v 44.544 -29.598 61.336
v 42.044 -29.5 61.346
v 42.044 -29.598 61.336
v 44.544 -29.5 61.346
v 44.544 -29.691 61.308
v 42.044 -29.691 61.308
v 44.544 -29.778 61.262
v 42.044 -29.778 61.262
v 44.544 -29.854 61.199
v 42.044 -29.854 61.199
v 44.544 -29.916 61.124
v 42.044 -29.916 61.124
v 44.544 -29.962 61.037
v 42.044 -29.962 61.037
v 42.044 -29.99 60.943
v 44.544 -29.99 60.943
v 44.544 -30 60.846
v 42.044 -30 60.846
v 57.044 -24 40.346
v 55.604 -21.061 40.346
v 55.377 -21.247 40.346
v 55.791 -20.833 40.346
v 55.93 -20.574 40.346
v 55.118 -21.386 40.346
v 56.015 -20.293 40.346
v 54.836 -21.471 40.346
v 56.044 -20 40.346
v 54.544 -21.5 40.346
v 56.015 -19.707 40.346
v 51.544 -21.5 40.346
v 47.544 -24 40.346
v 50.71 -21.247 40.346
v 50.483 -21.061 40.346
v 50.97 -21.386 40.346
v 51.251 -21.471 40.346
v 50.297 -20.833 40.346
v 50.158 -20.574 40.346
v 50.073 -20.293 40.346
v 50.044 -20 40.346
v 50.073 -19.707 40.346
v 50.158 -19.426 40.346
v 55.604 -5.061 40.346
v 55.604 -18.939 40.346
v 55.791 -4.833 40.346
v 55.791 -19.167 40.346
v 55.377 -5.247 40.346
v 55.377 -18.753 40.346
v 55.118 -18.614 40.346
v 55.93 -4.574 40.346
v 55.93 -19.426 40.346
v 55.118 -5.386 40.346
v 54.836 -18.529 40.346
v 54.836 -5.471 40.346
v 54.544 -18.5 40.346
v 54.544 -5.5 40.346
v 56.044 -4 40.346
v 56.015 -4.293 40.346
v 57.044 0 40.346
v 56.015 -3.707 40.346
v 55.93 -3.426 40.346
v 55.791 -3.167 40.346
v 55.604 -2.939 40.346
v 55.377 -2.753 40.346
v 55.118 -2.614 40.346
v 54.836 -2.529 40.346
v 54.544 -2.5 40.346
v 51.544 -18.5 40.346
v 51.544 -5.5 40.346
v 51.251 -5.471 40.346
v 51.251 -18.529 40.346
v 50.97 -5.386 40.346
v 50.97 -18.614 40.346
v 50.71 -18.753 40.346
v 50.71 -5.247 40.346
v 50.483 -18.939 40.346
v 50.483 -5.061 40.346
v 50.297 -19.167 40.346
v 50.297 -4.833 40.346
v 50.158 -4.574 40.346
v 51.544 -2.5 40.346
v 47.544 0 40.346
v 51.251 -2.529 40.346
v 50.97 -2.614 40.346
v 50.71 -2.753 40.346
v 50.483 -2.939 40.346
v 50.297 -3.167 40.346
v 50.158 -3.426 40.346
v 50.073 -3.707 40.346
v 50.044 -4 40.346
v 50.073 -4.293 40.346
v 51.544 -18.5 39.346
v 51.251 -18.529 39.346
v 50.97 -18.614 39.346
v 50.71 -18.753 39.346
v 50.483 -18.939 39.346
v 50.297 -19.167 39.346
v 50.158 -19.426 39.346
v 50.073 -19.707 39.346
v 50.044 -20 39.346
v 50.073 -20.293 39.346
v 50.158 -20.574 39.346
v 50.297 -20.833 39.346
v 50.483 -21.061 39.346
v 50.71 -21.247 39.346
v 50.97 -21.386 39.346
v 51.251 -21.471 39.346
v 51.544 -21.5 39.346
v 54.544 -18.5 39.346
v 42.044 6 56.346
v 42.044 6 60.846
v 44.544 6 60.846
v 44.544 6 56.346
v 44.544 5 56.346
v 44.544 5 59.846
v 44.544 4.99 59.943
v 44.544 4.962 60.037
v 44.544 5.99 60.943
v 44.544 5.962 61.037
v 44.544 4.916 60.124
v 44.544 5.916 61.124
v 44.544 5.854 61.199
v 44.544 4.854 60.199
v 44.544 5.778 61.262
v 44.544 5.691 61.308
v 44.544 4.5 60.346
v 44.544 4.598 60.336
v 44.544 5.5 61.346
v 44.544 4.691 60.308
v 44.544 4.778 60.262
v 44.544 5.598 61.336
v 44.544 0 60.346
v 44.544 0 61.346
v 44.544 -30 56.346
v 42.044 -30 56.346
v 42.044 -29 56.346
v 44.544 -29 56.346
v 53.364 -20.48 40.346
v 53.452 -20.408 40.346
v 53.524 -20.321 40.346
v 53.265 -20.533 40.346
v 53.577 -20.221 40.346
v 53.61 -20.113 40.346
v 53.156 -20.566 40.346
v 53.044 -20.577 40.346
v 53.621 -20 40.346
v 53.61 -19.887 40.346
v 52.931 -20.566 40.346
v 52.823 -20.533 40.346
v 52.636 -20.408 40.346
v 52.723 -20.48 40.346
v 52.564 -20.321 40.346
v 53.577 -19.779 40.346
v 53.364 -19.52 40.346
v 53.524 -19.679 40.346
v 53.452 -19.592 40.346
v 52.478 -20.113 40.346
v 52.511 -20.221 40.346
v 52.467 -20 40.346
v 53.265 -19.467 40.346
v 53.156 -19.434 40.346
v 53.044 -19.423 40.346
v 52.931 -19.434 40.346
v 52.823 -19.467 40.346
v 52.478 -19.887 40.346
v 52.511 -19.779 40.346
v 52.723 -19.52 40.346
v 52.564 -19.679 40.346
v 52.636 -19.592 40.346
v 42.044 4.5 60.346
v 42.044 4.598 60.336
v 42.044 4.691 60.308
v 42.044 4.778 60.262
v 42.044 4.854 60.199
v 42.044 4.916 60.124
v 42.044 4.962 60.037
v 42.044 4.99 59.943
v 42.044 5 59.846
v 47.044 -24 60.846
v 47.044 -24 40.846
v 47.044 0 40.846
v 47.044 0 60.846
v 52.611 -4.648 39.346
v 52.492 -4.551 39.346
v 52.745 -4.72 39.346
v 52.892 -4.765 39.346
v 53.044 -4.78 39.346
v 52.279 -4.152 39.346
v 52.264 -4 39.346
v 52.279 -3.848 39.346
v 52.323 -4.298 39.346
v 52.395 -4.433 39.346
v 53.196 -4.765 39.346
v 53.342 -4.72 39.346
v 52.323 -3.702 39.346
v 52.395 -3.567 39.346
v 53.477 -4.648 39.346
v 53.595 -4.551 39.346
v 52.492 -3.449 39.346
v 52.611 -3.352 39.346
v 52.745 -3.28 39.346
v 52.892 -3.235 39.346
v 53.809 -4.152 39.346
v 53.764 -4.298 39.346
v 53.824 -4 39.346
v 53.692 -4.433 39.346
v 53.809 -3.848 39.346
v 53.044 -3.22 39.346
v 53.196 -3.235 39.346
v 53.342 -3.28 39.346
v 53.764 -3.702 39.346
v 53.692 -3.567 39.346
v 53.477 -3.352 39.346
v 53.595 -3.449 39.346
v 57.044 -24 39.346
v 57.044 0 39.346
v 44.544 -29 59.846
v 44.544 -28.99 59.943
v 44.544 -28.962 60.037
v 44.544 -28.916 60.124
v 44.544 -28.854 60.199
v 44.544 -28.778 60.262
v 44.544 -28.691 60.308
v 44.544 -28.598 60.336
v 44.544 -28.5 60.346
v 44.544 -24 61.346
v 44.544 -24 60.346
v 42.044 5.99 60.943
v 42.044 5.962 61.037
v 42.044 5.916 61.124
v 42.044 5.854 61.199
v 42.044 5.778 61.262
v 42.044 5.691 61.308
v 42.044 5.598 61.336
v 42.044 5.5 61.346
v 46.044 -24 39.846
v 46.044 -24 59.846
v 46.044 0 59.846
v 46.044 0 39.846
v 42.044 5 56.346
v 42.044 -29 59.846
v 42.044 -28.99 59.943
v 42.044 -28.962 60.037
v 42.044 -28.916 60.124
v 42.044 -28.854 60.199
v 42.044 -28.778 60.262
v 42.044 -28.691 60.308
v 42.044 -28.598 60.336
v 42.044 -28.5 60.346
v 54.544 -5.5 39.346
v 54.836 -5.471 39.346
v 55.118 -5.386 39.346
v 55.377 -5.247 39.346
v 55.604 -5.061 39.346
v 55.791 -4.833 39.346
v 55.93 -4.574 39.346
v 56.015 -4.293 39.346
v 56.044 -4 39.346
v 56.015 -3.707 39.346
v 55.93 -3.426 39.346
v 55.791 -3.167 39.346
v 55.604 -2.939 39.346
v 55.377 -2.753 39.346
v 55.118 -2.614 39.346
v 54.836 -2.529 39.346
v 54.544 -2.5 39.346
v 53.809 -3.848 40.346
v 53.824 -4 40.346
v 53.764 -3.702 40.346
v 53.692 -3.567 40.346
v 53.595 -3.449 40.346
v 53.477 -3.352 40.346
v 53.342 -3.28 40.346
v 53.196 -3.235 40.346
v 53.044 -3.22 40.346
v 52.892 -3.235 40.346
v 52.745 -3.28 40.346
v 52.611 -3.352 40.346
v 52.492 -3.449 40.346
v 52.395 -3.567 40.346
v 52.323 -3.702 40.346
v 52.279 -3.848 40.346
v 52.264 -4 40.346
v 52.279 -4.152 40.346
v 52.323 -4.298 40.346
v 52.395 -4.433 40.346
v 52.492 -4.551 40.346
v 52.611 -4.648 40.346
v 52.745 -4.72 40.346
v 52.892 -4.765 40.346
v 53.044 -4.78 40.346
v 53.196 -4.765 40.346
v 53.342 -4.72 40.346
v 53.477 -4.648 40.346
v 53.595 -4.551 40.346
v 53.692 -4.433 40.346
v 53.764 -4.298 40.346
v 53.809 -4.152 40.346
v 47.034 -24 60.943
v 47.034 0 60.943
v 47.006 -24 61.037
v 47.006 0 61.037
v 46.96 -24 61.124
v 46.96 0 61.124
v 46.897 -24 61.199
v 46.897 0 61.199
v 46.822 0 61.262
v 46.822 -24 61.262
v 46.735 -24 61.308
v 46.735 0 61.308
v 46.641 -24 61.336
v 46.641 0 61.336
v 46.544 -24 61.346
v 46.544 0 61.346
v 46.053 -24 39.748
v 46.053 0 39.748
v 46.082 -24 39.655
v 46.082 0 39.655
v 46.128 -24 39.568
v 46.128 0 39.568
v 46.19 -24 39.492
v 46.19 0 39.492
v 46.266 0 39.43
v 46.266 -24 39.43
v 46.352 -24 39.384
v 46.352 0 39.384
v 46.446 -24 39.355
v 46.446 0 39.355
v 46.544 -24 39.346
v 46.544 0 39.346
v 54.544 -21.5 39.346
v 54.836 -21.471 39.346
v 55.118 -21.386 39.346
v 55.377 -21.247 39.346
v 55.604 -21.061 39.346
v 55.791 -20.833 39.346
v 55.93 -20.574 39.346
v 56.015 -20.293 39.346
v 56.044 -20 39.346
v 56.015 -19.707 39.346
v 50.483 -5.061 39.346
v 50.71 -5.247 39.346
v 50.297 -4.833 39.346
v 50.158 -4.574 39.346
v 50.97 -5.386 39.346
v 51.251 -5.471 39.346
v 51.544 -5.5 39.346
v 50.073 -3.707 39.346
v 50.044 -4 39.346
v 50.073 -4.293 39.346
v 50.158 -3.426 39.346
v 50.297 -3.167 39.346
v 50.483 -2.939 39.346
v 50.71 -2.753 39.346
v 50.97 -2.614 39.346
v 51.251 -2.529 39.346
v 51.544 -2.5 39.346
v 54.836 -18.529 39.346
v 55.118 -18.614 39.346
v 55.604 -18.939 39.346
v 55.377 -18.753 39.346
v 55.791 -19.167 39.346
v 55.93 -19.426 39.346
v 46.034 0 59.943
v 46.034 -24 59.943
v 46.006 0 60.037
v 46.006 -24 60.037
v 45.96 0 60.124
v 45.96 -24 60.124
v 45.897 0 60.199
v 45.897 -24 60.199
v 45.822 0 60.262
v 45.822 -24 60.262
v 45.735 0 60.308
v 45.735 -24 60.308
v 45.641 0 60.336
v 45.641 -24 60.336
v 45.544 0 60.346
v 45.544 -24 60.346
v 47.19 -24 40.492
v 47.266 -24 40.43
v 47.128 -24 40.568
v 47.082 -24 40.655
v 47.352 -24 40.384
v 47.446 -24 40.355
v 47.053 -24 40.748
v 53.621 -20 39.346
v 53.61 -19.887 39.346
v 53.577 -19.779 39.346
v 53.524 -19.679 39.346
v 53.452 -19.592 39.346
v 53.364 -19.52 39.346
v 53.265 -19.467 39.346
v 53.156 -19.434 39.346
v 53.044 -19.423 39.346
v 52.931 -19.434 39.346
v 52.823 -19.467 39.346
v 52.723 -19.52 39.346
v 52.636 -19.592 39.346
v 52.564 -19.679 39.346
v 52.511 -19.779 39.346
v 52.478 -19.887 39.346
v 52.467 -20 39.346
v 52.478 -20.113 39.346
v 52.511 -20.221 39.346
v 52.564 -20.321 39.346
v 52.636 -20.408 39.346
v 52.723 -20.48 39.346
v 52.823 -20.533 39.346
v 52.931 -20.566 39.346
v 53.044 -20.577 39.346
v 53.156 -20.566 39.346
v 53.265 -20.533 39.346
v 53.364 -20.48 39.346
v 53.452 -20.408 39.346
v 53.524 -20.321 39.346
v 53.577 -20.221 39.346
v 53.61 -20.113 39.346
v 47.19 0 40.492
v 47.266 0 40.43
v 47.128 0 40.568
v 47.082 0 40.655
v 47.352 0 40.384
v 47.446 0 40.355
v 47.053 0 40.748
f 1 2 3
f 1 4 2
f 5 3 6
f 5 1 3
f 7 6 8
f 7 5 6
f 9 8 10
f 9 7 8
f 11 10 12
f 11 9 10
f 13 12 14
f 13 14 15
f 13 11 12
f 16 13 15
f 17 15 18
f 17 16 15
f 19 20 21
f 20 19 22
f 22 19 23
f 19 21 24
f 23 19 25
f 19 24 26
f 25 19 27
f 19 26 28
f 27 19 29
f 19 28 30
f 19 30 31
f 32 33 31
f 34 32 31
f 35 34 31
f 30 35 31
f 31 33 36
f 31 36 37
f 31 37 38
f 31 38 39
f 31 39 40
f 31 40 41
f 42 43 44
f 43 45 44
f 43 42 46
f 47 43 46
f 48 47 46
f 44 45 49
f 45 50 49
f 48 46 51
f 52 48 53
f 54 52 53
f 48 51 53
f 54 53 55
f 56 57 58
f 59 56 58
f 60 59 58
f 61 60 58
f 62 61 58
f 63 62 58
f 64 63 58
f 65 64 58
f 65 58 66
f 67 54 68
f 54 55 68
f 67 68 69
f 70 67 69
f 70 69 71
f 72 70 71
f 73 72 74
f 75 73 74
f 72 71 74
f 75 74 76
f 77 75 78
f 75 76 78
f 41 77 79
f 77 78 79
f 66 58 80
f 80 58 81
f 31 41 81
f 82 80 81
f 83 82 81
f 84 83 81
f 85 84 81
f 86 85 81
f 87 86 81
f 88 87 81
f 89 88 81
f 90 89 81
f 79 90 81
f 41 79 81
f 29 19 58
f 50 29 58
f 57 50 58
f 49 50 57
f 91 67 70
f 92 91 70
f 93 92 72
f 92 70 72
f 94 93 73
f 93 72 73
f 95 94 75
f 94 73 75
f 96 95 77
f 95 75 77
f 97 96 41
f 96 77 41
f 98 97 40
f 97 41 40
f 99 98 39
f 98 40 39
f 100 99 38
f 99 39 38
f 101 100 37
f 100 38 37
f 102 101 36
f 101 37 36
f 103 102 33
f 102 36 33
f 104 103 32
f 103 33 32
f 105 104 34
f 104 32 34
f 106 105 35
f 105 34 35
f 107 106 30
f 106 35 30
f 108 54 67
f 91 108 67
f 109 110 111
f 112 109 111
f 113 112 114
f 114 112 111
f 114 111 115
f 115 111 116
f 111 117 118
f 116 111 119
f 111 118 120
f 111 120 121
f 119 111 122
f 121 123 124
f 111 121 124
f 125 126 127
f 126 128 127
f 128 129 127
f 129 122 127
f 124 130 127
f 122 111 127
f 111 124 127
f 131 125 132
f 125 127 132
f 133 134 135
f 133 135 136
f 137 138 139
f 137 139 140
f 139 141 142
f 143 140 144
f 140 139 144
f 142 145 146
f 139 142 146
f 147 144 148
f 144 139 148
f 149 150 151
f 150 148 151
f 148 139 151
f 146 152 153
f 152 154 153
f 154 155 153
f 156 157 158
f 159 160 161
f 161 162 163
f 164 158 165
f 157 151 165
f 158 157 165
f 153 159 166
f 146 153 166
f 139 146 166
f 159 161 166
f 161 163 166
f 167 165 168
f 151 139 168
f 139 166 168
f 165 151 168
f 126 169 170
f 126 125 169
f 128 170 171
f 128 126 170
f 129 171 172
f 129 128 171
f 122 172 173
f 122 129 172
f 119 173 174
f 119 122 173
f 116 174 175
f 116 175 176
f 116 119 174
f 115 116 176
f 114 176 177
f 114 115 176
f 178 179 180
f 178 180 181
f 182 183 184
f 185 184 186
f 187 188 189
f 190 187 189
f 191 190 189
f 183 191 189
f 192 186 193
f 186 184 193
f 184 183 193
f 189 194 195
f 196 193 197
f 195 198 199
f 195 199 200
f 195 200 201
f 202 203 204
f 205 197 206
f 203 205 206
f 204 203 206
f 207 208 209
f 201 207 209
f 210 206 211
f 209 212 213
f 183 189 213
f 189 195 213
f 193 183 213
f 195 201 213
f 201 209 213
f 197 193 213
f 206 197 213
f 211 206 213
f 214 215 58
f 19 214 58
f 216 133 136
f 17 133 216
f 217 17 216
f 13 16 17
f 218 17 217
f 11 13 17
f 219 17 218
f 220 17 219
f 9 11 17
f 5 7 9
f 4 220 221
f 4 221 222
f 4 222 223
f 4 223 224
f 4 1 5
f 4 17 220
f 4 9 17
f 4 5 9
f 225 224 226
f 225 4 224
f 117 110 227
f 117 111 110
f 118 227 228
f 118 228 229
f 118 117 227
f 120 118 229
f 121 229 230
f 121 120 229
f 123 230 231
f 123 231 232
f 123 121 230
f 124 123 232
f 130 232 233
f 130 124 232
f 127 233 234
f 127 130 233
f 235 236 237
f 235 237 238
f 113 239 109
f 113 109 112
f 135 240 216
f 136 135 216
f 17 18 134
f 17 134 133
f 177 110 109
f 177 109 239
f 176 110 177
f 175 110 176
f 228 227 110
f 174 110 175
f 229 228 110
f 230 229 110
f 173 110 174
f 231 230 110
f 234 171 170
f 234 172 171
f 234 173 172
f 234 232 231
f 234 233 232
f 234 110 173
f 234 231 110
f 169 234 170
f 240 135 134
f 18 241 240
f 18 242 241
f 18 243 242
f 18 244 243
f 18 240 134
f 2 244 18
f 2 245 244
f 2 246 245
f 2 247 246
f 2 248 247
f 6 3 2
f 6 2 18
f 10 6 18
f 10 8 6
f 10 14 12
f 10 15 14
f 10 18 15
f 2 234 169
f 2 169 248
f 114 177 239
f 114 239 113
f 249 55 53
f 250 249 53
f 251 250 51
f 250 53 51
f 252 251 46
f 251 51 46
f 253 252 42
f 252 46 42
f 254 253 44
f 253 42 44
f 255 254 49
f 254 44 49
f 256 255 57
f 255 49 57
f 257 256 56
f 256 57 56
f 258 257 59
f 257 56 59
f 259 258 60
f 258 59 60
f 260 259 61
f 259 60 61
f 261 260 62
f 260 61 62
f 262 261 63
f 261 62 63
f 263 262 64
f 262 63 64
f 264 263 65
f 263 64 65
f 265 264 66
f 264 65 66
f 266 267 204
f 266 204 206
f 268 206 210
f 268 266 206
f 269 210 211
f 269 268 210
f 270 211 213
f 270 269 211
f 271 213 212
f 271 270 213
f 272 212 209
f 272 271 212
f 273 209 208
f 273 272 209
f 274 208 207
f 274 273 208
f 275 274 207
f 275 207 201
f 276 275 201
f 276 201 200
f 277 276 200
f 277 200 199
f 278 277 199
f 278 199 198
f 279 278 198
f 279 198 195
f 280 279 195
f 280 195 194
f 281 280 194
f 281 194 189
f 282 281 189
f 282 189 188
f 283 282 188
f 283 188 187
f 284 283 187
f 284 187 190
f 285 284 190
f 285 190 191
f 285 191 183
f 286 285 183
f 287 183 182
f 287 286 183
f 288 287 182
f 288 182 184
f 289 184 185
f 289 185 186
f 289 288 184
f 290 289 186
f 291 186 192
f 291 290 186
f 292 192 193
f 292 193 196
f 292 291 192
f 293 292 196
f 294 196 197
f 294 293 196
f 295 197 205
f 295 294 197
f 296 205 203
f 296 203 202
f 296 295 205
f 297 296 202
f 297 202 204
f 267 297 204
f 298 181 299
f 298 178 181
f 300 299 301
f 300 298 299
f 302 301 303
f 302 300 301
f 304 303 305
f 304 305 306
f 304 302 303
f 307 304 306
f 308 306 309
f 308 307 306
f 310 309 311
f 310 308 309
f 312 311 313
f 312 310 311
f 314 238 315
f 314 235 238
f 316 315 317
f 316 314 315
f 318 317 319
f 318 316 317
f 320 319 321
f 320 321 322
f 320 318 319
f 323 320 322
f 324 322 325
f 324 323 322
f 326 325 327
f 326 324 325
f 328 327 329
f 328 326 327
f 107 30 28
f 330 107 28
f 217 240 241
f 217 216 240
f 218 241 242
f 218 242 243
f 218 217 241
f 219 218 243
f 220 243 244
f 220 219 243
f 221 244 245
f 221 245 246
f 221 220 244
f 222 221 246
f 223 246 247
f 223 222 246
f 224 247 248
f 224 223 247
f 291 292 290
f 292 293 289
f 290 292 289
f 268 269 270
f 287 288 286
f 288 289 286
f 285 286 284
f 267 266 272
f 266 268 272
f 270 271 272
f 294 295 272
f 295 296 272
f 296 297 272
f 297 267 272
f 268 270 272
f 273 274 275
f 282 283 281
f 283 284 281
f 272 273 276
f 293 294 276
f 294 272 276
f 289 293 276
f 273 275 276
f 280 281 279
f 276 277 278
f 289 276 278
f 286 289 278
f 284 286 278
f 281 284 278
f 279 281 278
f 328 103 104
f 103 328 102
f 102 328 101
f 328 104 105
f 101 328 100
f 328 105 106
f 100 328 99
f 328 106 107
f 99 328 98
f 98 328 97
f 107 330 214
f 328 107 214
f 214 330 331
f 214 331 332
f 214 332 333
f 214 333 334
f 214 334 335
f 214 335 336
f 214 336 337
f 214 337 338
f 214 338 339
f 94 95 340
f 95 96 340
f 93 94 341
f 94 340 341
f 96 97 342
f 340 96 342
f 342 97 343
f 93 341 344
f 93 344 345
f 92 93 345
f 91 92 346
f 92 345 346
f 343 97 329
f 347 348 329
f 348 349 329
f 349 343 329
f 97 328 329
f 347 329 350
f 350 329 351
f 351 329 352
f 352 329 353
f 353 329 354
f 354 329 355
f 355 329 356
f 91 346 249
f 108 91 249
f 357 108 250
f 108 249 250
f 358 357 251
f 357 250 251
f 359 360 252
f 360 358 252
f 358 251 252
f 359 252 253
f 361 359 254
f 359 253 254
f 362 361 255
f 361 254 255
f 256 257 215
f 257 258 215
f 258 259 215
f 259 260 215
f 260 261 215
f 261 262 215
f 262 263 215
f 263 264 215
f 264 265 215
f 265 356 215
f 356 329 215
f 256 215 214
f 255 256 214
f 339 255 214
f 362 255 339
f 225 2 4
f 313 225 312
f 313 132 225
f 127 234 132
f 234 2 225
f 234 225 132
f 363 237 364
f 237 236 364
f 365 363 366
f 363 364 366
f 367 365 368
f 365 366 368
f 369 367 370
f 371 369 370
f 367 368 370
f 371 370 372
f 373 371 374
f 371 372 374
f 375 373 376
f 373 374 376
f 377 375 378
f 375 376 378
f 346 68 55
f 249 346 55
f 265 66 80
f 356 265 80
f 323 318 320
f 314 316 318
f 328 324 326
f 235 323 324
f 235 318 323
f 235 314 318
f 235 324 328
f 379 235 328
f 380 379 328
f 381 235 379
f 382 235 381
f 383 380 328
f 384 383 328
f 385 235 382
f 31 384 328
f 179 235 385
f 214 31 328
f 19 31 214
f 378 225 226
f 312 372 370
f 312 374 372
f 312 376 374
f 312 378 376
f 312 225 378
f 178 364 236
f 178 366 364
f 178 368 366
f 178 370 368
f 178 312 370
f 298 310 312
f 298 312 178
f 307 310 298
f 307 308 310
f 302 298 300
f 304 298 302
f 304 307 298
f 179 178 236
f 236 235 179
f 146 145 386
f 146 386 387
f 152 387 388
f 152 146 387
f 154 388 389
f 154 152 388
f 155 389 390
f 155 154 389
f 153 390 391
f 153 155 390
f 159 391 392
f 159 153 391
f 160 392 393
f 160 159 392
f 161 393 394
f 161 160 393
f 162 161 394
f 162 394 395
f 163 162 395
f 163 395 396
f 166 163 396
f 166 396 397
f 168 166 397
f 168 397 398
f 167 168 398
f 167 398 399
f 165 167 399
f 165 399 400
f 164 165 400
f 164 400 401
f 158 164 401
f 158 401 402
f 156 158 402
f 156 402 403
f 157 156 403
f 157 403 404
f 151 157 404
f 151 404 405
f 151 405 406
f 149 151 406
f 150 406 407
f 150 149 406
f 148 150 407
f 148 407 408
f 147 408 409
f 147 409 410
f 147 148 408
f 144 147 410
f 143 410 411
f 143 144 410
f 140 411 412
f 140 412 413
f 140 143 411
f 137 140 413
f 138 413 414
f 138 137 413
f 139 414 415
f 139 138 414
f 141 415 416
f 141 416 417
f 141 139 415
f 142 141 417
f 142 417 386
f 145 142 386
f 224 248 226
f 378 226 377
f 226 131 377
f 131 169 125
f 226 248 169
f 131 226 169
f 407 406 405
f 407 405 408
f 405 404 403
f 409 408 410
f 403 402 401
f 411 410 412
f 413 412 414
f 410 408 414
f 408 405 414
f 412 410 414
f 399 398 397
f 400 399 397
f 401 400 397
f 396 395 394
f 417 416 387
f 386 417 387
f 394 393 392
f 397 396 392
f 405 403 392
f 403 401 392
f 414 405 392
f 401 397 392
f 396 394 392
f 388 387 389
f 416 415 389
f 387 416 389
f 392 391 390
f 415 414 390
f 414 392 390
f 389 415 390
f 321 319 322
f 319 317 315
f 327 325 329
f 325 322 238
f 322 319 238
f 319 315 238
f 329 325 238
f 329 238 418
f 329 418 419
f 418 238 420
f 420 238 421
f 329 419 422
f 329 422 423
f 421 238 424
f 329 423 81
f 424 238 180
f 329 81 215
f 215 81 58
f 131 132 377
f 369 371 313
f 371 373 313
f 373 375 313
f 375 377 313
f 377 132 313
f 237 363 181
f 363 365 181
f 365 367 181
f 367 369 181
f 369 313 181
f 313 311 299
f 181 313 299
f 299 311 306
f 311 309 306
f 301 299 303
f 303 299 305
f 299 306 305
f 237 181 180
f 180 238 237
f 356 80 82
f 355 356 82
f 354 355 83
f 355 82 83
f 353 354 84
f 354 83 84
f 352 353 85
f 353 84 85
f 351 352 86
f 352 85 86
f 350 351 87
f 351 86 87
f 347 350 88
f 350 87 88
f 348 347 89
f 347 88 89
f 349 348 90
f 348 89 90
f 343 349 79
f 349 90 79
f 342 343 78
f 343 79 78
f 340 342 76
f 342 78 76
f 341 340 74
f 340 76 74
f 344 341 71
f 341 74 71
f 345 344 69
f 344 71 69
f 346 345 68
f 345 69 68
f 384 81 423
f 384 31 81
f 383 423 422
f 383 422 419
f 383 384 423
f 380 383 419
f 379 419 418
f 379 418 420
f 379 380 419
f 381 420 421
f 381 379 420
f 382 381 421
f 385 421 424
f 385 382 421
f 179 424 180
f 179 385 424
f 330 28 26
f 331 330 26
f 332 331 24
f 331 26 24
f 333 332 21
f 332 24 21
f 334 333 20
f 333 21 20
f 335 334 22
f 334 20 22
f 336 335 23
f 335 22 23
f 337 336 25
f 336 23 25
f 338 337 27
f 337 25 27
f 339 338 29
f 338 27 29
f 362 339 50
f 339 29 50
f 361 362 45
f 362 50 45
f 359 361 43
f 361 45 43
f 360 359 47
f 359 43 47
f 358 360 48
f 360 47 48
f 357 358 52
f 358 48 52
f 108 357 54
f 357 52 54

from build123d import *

# Parameters (mm, degrees)
F1_DEPTH = 24
F2_W     = 2.5
F2_H     = 6
F3_DEPTH = 1
F4_W     = 2.5
F4_H     = 1
F5_DEPTH = 4
F6_R     = 0.5
F7_R     = 0.577109
F7_R_2   = 0.779813
F8_DEPTH = 2


with BuildPart() as f1:
    # F0 (on Front) → F1 (new body)
    with BuildSketch(Plane.XZ):
        Polygon((57.043818, 40.345872), (47.043818, 40.345872), (47.043818, 61.345872), (42.043818, 61.345872), (42.043818, 60.345872), (46.043818, 60.345872), (46.043818, 39.345872), (57.043818, 39.345872), align=None)
    extrude(amount=F1_DEPTH)

    # F2 (on face) → F3 (join)
    with BuildSketch(Plane.XY.offset(61.345872)):
        with Locations((43.293818, -27)):
            Rectangle(F2_W, F2_H)
        with Locations((43.293818, 3)):
            Rectangle(F2_W, F2_H)
    extrude(amount=-F3_DEPTH)

    # F4 (on face) → F5 (join)
    with BuildSketch(Plane(origin=(0, 0, 60.345872), x_dir=(1, 0, 0), z_dir=(0, 0, -1))):
        with Locations((43.293818, -5.5)):
            Rectangle(F4_W, F4_H)
        with Locations((43.293818, 29.5)):
            Rectangle(F4_W, F4_H)
    extrude(amount=F5_DEPTH)

    # F6
    f6_edges = [f1.edges().sort_by_distance(p)[0] for p in [
        (47.043818, -12, 40.345872),
        (46.043818, -12, 39.345872),
        (47.043818, -12, 61.345872),
        (46.043818, -12, 60.345872),
        (43.293818, 5, 60.345872),
        (43.293818, -29, 60.345872),
        (43.293818, 6, 61.345872),
        (43.293818, -30, 61.345872),
    ]]
    fillet(f6_edges, radius=F6_R)

    # F7 (on face) → F8 (cut)
    with BuildSketch(Plane.XY.offset(40.345872)):
        with BuildLine():
            ThreePointArc((54.543818, -21.5), (56.043818, -20), (54.543818, -18.5))
            Line((54.543818, -18.5), (51.543818, -18.5))
            ThreePointArc((51.543818, -18.5), (50.043818, -20), (51.543818, -21.5))
            Line((51.543818, -21.5), (54.543818, -21.5))
        make_face()
        with Locations((53.043818, -20)):
            Circle(F7_R, mode=Mode.SUBTRACT)
        with BuildLine():
            ThreePointArc((54.543818, -5.5), (56.043818, -4), (54.543818, -2.5))
            Line((54.543818, -2.5), (51.543818, -2.5))
            ThreePointArc((51.543818, -2.5), (50.043818, -4), (51.543818, -5.5))
            Line((51.543818, -5.5), (54.543818, -5.5))
        make_face()
        with Locations((53.043818, -4)):
            Circle(F7_R_2, mode=Mode.SUBTRACT)
    extrude(amount=-F8_DEPTH, mode=Mode.SUBTRACT)


solid = f1.part
